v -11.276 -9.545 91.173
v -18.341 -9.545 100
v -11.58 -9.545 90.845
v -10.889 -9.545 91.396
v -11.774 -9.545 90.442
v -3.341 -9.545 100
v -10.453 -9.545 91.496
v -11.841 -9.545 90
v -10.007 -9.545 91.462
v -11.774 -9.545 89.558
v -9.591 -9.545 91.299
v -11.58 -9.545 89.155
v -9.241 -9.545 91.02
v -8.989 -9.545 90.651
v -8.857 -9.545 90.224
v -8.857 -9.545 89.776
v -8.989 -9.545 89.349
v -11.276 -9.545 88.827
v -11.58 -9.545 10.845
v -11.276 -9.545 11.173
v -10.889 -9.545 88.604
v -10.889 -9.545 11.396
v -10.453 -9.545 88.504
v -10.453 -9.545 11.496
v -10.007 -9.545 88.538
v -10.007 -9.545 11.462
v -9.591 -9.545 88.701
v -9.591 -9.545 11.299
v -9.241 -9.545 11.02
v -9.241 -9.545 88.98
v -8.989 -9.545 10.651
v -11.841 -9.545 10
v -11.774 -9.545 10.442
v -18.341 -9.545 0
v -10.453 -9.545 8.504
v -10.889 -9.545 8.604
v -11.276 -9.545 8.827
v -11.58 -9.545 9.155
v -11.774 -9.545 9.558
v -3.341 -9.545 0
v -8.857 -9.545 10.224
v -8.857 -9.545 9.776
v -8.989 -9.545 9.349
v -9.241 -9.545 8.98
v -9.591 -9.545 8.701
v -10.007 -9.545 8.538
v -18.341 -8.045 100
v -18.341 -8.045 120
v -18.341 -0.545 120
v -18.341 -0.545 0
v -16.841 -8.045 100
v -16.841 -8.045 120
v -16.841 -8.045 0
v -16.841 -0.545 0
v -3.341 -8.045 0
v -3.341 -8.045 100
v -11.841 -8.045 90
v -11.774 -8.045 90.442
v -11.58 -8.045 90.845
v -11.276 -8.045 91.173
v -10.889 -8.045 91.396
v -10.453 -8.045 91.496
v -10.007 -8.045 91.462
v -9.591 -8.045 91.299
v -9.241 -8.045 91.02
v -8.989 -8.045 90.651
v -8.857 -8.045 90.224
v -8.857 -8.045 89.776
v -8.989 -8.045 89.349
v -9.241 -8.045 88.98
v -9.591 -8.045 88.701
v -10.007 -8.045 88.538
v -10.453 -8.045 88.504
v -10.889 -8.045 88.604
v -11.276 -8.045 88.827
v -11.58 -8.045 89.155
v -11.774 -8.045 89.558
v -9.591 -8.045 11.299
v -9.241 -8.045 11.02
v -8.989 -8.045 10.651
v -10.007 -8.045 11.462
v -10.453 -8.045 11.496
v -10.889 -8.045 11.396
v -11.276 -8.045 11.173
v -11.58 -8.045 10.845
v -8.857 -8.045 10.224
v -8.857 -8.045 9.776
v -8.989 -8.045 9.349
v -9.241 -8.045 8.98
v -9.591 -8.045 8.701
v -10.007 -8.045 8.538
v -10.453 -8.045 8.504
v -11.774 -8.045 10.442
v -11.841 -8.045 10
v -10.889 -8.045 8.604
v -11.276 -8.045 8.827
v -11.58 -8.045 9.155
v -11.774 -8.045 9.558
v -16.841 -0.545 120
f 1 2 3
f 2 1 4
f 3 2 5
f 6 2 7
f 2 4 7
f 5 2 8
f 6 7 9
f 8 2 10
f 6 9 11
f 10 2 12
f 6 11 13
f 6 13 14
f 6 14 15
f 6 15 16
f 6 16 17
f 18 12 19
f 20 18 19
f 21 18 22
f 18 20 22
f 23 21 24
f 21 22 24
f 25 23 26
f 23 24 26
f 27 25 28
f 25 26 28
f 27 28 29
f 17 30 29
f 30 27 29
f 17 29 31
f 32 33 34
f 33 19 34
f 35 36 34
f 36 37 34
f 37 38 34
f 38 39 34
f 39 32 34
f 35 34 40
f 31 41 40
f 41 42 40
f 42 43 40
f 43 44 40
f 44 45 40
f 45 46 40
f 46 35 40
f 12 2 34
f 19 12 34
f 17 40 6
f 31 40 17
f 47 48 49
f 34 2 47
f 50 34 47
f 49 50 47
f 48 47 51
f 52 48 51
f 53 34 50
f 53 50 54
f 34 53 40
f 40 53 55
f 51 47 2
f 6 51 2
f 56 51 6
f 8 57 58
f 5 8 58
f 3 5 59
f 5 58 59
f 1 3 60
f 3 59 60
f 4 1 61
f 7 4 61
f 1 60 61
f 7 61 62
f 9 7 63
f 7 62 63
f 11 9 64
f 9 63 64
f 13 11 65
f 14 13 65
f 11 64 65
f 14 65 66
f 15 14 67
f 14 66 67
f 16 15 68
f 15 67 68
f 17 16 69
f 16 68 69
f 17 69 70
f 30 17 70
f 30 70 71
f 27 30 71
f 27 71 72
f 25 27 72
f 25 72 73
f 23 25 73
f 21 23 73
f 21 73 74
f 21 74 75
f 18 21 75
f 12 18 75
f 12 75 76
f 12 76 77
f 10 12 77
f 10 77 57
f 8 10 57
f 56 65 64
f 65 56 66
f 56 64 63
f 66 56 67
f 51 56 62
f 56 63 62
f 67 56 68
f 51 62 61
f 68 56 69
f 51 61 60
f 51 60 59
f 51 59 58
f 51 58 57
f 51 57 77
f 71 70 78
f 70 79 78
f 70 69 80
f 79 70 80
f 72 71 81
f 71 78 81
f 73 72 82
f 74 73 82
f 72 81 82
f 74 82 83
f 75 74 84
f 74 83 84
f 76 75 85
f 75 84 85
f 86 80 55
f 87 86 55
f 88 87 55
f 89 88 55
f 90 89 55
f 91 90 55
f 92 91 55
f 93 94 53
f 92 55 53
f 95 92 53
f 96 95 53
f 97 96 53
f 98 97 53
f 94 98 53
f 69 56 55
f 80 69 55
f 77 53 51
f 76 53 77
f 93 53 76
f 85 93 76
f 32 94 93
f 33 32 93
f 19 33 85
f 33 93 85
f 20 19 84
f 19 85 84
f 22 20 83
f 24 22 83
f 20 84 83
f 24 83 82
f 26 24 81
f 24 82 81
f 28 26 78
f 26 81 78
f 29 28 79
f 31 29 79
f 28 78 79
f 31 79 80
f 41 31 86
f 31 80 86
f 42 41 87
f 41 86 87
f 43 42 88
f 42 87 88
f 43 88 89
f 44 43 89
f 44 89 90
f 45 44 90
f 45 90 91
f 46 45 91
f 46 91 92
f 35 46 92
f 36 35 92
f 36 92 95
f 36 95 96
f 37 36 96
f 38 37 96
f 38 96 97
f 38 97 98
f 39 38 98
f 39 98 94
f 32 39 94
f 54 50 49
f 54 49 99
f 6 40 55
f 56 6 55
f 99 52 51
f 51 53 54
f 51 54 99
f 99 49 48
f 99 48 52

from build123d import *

# Parameters (mm, degrees)
EXTRUSION1_DEPTH = 100
ESQUISSE2_R      = 1.5
EXTRUSION2_DEPTH = 120
ESQUISSE3_W      = 1.5
ESQUISSE3_H      = 7.5
EXTRUSION3_DEPTH = 20


with BuildPart() as part:
    # Esquisse1 → Extrusion1 (new body)
    with BuildSketch(Plane.XY):
        Polygon((-18.340739011, -0.545052632), (-18.340739011, -9.545052632), (-3.340739011, -9.545052632), (-3.340739011, -8.045052632), (-16.840739011, -8.045052632), (-16.840739011, -0.545052632), align=None)
    extrude(amount=EXTRUSION1_DEPTH)

    # Esquisse2 → Extrusion2 (cut)
    with BuildSketch(Plane(origin=(0, -8.045052632, 0), x_dir=(-1, 0, 0), z_dir=(0, 1, 0))):
        with Locations((10.340739011, 90)):
            Circle(ESQUISSE2_R)
        with Locations((10.340739011, 10)):
            Circle(ESQUISSE2_R)
    extrude(amount=-EXTRUSION2_DEPTH, mode=Mode.SUBTRACT)

    # Esquisse3 → Extrusion3 (add)
    with BuildSketch(Plane.XY.offset(100)):
        with Locations((-17.590739011, -4.295052632)):
            Rectangle(ESQUISSE3_W, ESQUISSE3_H)
    extrude(amount=EXTRUSION3_DEPTH)


solid = part.part
